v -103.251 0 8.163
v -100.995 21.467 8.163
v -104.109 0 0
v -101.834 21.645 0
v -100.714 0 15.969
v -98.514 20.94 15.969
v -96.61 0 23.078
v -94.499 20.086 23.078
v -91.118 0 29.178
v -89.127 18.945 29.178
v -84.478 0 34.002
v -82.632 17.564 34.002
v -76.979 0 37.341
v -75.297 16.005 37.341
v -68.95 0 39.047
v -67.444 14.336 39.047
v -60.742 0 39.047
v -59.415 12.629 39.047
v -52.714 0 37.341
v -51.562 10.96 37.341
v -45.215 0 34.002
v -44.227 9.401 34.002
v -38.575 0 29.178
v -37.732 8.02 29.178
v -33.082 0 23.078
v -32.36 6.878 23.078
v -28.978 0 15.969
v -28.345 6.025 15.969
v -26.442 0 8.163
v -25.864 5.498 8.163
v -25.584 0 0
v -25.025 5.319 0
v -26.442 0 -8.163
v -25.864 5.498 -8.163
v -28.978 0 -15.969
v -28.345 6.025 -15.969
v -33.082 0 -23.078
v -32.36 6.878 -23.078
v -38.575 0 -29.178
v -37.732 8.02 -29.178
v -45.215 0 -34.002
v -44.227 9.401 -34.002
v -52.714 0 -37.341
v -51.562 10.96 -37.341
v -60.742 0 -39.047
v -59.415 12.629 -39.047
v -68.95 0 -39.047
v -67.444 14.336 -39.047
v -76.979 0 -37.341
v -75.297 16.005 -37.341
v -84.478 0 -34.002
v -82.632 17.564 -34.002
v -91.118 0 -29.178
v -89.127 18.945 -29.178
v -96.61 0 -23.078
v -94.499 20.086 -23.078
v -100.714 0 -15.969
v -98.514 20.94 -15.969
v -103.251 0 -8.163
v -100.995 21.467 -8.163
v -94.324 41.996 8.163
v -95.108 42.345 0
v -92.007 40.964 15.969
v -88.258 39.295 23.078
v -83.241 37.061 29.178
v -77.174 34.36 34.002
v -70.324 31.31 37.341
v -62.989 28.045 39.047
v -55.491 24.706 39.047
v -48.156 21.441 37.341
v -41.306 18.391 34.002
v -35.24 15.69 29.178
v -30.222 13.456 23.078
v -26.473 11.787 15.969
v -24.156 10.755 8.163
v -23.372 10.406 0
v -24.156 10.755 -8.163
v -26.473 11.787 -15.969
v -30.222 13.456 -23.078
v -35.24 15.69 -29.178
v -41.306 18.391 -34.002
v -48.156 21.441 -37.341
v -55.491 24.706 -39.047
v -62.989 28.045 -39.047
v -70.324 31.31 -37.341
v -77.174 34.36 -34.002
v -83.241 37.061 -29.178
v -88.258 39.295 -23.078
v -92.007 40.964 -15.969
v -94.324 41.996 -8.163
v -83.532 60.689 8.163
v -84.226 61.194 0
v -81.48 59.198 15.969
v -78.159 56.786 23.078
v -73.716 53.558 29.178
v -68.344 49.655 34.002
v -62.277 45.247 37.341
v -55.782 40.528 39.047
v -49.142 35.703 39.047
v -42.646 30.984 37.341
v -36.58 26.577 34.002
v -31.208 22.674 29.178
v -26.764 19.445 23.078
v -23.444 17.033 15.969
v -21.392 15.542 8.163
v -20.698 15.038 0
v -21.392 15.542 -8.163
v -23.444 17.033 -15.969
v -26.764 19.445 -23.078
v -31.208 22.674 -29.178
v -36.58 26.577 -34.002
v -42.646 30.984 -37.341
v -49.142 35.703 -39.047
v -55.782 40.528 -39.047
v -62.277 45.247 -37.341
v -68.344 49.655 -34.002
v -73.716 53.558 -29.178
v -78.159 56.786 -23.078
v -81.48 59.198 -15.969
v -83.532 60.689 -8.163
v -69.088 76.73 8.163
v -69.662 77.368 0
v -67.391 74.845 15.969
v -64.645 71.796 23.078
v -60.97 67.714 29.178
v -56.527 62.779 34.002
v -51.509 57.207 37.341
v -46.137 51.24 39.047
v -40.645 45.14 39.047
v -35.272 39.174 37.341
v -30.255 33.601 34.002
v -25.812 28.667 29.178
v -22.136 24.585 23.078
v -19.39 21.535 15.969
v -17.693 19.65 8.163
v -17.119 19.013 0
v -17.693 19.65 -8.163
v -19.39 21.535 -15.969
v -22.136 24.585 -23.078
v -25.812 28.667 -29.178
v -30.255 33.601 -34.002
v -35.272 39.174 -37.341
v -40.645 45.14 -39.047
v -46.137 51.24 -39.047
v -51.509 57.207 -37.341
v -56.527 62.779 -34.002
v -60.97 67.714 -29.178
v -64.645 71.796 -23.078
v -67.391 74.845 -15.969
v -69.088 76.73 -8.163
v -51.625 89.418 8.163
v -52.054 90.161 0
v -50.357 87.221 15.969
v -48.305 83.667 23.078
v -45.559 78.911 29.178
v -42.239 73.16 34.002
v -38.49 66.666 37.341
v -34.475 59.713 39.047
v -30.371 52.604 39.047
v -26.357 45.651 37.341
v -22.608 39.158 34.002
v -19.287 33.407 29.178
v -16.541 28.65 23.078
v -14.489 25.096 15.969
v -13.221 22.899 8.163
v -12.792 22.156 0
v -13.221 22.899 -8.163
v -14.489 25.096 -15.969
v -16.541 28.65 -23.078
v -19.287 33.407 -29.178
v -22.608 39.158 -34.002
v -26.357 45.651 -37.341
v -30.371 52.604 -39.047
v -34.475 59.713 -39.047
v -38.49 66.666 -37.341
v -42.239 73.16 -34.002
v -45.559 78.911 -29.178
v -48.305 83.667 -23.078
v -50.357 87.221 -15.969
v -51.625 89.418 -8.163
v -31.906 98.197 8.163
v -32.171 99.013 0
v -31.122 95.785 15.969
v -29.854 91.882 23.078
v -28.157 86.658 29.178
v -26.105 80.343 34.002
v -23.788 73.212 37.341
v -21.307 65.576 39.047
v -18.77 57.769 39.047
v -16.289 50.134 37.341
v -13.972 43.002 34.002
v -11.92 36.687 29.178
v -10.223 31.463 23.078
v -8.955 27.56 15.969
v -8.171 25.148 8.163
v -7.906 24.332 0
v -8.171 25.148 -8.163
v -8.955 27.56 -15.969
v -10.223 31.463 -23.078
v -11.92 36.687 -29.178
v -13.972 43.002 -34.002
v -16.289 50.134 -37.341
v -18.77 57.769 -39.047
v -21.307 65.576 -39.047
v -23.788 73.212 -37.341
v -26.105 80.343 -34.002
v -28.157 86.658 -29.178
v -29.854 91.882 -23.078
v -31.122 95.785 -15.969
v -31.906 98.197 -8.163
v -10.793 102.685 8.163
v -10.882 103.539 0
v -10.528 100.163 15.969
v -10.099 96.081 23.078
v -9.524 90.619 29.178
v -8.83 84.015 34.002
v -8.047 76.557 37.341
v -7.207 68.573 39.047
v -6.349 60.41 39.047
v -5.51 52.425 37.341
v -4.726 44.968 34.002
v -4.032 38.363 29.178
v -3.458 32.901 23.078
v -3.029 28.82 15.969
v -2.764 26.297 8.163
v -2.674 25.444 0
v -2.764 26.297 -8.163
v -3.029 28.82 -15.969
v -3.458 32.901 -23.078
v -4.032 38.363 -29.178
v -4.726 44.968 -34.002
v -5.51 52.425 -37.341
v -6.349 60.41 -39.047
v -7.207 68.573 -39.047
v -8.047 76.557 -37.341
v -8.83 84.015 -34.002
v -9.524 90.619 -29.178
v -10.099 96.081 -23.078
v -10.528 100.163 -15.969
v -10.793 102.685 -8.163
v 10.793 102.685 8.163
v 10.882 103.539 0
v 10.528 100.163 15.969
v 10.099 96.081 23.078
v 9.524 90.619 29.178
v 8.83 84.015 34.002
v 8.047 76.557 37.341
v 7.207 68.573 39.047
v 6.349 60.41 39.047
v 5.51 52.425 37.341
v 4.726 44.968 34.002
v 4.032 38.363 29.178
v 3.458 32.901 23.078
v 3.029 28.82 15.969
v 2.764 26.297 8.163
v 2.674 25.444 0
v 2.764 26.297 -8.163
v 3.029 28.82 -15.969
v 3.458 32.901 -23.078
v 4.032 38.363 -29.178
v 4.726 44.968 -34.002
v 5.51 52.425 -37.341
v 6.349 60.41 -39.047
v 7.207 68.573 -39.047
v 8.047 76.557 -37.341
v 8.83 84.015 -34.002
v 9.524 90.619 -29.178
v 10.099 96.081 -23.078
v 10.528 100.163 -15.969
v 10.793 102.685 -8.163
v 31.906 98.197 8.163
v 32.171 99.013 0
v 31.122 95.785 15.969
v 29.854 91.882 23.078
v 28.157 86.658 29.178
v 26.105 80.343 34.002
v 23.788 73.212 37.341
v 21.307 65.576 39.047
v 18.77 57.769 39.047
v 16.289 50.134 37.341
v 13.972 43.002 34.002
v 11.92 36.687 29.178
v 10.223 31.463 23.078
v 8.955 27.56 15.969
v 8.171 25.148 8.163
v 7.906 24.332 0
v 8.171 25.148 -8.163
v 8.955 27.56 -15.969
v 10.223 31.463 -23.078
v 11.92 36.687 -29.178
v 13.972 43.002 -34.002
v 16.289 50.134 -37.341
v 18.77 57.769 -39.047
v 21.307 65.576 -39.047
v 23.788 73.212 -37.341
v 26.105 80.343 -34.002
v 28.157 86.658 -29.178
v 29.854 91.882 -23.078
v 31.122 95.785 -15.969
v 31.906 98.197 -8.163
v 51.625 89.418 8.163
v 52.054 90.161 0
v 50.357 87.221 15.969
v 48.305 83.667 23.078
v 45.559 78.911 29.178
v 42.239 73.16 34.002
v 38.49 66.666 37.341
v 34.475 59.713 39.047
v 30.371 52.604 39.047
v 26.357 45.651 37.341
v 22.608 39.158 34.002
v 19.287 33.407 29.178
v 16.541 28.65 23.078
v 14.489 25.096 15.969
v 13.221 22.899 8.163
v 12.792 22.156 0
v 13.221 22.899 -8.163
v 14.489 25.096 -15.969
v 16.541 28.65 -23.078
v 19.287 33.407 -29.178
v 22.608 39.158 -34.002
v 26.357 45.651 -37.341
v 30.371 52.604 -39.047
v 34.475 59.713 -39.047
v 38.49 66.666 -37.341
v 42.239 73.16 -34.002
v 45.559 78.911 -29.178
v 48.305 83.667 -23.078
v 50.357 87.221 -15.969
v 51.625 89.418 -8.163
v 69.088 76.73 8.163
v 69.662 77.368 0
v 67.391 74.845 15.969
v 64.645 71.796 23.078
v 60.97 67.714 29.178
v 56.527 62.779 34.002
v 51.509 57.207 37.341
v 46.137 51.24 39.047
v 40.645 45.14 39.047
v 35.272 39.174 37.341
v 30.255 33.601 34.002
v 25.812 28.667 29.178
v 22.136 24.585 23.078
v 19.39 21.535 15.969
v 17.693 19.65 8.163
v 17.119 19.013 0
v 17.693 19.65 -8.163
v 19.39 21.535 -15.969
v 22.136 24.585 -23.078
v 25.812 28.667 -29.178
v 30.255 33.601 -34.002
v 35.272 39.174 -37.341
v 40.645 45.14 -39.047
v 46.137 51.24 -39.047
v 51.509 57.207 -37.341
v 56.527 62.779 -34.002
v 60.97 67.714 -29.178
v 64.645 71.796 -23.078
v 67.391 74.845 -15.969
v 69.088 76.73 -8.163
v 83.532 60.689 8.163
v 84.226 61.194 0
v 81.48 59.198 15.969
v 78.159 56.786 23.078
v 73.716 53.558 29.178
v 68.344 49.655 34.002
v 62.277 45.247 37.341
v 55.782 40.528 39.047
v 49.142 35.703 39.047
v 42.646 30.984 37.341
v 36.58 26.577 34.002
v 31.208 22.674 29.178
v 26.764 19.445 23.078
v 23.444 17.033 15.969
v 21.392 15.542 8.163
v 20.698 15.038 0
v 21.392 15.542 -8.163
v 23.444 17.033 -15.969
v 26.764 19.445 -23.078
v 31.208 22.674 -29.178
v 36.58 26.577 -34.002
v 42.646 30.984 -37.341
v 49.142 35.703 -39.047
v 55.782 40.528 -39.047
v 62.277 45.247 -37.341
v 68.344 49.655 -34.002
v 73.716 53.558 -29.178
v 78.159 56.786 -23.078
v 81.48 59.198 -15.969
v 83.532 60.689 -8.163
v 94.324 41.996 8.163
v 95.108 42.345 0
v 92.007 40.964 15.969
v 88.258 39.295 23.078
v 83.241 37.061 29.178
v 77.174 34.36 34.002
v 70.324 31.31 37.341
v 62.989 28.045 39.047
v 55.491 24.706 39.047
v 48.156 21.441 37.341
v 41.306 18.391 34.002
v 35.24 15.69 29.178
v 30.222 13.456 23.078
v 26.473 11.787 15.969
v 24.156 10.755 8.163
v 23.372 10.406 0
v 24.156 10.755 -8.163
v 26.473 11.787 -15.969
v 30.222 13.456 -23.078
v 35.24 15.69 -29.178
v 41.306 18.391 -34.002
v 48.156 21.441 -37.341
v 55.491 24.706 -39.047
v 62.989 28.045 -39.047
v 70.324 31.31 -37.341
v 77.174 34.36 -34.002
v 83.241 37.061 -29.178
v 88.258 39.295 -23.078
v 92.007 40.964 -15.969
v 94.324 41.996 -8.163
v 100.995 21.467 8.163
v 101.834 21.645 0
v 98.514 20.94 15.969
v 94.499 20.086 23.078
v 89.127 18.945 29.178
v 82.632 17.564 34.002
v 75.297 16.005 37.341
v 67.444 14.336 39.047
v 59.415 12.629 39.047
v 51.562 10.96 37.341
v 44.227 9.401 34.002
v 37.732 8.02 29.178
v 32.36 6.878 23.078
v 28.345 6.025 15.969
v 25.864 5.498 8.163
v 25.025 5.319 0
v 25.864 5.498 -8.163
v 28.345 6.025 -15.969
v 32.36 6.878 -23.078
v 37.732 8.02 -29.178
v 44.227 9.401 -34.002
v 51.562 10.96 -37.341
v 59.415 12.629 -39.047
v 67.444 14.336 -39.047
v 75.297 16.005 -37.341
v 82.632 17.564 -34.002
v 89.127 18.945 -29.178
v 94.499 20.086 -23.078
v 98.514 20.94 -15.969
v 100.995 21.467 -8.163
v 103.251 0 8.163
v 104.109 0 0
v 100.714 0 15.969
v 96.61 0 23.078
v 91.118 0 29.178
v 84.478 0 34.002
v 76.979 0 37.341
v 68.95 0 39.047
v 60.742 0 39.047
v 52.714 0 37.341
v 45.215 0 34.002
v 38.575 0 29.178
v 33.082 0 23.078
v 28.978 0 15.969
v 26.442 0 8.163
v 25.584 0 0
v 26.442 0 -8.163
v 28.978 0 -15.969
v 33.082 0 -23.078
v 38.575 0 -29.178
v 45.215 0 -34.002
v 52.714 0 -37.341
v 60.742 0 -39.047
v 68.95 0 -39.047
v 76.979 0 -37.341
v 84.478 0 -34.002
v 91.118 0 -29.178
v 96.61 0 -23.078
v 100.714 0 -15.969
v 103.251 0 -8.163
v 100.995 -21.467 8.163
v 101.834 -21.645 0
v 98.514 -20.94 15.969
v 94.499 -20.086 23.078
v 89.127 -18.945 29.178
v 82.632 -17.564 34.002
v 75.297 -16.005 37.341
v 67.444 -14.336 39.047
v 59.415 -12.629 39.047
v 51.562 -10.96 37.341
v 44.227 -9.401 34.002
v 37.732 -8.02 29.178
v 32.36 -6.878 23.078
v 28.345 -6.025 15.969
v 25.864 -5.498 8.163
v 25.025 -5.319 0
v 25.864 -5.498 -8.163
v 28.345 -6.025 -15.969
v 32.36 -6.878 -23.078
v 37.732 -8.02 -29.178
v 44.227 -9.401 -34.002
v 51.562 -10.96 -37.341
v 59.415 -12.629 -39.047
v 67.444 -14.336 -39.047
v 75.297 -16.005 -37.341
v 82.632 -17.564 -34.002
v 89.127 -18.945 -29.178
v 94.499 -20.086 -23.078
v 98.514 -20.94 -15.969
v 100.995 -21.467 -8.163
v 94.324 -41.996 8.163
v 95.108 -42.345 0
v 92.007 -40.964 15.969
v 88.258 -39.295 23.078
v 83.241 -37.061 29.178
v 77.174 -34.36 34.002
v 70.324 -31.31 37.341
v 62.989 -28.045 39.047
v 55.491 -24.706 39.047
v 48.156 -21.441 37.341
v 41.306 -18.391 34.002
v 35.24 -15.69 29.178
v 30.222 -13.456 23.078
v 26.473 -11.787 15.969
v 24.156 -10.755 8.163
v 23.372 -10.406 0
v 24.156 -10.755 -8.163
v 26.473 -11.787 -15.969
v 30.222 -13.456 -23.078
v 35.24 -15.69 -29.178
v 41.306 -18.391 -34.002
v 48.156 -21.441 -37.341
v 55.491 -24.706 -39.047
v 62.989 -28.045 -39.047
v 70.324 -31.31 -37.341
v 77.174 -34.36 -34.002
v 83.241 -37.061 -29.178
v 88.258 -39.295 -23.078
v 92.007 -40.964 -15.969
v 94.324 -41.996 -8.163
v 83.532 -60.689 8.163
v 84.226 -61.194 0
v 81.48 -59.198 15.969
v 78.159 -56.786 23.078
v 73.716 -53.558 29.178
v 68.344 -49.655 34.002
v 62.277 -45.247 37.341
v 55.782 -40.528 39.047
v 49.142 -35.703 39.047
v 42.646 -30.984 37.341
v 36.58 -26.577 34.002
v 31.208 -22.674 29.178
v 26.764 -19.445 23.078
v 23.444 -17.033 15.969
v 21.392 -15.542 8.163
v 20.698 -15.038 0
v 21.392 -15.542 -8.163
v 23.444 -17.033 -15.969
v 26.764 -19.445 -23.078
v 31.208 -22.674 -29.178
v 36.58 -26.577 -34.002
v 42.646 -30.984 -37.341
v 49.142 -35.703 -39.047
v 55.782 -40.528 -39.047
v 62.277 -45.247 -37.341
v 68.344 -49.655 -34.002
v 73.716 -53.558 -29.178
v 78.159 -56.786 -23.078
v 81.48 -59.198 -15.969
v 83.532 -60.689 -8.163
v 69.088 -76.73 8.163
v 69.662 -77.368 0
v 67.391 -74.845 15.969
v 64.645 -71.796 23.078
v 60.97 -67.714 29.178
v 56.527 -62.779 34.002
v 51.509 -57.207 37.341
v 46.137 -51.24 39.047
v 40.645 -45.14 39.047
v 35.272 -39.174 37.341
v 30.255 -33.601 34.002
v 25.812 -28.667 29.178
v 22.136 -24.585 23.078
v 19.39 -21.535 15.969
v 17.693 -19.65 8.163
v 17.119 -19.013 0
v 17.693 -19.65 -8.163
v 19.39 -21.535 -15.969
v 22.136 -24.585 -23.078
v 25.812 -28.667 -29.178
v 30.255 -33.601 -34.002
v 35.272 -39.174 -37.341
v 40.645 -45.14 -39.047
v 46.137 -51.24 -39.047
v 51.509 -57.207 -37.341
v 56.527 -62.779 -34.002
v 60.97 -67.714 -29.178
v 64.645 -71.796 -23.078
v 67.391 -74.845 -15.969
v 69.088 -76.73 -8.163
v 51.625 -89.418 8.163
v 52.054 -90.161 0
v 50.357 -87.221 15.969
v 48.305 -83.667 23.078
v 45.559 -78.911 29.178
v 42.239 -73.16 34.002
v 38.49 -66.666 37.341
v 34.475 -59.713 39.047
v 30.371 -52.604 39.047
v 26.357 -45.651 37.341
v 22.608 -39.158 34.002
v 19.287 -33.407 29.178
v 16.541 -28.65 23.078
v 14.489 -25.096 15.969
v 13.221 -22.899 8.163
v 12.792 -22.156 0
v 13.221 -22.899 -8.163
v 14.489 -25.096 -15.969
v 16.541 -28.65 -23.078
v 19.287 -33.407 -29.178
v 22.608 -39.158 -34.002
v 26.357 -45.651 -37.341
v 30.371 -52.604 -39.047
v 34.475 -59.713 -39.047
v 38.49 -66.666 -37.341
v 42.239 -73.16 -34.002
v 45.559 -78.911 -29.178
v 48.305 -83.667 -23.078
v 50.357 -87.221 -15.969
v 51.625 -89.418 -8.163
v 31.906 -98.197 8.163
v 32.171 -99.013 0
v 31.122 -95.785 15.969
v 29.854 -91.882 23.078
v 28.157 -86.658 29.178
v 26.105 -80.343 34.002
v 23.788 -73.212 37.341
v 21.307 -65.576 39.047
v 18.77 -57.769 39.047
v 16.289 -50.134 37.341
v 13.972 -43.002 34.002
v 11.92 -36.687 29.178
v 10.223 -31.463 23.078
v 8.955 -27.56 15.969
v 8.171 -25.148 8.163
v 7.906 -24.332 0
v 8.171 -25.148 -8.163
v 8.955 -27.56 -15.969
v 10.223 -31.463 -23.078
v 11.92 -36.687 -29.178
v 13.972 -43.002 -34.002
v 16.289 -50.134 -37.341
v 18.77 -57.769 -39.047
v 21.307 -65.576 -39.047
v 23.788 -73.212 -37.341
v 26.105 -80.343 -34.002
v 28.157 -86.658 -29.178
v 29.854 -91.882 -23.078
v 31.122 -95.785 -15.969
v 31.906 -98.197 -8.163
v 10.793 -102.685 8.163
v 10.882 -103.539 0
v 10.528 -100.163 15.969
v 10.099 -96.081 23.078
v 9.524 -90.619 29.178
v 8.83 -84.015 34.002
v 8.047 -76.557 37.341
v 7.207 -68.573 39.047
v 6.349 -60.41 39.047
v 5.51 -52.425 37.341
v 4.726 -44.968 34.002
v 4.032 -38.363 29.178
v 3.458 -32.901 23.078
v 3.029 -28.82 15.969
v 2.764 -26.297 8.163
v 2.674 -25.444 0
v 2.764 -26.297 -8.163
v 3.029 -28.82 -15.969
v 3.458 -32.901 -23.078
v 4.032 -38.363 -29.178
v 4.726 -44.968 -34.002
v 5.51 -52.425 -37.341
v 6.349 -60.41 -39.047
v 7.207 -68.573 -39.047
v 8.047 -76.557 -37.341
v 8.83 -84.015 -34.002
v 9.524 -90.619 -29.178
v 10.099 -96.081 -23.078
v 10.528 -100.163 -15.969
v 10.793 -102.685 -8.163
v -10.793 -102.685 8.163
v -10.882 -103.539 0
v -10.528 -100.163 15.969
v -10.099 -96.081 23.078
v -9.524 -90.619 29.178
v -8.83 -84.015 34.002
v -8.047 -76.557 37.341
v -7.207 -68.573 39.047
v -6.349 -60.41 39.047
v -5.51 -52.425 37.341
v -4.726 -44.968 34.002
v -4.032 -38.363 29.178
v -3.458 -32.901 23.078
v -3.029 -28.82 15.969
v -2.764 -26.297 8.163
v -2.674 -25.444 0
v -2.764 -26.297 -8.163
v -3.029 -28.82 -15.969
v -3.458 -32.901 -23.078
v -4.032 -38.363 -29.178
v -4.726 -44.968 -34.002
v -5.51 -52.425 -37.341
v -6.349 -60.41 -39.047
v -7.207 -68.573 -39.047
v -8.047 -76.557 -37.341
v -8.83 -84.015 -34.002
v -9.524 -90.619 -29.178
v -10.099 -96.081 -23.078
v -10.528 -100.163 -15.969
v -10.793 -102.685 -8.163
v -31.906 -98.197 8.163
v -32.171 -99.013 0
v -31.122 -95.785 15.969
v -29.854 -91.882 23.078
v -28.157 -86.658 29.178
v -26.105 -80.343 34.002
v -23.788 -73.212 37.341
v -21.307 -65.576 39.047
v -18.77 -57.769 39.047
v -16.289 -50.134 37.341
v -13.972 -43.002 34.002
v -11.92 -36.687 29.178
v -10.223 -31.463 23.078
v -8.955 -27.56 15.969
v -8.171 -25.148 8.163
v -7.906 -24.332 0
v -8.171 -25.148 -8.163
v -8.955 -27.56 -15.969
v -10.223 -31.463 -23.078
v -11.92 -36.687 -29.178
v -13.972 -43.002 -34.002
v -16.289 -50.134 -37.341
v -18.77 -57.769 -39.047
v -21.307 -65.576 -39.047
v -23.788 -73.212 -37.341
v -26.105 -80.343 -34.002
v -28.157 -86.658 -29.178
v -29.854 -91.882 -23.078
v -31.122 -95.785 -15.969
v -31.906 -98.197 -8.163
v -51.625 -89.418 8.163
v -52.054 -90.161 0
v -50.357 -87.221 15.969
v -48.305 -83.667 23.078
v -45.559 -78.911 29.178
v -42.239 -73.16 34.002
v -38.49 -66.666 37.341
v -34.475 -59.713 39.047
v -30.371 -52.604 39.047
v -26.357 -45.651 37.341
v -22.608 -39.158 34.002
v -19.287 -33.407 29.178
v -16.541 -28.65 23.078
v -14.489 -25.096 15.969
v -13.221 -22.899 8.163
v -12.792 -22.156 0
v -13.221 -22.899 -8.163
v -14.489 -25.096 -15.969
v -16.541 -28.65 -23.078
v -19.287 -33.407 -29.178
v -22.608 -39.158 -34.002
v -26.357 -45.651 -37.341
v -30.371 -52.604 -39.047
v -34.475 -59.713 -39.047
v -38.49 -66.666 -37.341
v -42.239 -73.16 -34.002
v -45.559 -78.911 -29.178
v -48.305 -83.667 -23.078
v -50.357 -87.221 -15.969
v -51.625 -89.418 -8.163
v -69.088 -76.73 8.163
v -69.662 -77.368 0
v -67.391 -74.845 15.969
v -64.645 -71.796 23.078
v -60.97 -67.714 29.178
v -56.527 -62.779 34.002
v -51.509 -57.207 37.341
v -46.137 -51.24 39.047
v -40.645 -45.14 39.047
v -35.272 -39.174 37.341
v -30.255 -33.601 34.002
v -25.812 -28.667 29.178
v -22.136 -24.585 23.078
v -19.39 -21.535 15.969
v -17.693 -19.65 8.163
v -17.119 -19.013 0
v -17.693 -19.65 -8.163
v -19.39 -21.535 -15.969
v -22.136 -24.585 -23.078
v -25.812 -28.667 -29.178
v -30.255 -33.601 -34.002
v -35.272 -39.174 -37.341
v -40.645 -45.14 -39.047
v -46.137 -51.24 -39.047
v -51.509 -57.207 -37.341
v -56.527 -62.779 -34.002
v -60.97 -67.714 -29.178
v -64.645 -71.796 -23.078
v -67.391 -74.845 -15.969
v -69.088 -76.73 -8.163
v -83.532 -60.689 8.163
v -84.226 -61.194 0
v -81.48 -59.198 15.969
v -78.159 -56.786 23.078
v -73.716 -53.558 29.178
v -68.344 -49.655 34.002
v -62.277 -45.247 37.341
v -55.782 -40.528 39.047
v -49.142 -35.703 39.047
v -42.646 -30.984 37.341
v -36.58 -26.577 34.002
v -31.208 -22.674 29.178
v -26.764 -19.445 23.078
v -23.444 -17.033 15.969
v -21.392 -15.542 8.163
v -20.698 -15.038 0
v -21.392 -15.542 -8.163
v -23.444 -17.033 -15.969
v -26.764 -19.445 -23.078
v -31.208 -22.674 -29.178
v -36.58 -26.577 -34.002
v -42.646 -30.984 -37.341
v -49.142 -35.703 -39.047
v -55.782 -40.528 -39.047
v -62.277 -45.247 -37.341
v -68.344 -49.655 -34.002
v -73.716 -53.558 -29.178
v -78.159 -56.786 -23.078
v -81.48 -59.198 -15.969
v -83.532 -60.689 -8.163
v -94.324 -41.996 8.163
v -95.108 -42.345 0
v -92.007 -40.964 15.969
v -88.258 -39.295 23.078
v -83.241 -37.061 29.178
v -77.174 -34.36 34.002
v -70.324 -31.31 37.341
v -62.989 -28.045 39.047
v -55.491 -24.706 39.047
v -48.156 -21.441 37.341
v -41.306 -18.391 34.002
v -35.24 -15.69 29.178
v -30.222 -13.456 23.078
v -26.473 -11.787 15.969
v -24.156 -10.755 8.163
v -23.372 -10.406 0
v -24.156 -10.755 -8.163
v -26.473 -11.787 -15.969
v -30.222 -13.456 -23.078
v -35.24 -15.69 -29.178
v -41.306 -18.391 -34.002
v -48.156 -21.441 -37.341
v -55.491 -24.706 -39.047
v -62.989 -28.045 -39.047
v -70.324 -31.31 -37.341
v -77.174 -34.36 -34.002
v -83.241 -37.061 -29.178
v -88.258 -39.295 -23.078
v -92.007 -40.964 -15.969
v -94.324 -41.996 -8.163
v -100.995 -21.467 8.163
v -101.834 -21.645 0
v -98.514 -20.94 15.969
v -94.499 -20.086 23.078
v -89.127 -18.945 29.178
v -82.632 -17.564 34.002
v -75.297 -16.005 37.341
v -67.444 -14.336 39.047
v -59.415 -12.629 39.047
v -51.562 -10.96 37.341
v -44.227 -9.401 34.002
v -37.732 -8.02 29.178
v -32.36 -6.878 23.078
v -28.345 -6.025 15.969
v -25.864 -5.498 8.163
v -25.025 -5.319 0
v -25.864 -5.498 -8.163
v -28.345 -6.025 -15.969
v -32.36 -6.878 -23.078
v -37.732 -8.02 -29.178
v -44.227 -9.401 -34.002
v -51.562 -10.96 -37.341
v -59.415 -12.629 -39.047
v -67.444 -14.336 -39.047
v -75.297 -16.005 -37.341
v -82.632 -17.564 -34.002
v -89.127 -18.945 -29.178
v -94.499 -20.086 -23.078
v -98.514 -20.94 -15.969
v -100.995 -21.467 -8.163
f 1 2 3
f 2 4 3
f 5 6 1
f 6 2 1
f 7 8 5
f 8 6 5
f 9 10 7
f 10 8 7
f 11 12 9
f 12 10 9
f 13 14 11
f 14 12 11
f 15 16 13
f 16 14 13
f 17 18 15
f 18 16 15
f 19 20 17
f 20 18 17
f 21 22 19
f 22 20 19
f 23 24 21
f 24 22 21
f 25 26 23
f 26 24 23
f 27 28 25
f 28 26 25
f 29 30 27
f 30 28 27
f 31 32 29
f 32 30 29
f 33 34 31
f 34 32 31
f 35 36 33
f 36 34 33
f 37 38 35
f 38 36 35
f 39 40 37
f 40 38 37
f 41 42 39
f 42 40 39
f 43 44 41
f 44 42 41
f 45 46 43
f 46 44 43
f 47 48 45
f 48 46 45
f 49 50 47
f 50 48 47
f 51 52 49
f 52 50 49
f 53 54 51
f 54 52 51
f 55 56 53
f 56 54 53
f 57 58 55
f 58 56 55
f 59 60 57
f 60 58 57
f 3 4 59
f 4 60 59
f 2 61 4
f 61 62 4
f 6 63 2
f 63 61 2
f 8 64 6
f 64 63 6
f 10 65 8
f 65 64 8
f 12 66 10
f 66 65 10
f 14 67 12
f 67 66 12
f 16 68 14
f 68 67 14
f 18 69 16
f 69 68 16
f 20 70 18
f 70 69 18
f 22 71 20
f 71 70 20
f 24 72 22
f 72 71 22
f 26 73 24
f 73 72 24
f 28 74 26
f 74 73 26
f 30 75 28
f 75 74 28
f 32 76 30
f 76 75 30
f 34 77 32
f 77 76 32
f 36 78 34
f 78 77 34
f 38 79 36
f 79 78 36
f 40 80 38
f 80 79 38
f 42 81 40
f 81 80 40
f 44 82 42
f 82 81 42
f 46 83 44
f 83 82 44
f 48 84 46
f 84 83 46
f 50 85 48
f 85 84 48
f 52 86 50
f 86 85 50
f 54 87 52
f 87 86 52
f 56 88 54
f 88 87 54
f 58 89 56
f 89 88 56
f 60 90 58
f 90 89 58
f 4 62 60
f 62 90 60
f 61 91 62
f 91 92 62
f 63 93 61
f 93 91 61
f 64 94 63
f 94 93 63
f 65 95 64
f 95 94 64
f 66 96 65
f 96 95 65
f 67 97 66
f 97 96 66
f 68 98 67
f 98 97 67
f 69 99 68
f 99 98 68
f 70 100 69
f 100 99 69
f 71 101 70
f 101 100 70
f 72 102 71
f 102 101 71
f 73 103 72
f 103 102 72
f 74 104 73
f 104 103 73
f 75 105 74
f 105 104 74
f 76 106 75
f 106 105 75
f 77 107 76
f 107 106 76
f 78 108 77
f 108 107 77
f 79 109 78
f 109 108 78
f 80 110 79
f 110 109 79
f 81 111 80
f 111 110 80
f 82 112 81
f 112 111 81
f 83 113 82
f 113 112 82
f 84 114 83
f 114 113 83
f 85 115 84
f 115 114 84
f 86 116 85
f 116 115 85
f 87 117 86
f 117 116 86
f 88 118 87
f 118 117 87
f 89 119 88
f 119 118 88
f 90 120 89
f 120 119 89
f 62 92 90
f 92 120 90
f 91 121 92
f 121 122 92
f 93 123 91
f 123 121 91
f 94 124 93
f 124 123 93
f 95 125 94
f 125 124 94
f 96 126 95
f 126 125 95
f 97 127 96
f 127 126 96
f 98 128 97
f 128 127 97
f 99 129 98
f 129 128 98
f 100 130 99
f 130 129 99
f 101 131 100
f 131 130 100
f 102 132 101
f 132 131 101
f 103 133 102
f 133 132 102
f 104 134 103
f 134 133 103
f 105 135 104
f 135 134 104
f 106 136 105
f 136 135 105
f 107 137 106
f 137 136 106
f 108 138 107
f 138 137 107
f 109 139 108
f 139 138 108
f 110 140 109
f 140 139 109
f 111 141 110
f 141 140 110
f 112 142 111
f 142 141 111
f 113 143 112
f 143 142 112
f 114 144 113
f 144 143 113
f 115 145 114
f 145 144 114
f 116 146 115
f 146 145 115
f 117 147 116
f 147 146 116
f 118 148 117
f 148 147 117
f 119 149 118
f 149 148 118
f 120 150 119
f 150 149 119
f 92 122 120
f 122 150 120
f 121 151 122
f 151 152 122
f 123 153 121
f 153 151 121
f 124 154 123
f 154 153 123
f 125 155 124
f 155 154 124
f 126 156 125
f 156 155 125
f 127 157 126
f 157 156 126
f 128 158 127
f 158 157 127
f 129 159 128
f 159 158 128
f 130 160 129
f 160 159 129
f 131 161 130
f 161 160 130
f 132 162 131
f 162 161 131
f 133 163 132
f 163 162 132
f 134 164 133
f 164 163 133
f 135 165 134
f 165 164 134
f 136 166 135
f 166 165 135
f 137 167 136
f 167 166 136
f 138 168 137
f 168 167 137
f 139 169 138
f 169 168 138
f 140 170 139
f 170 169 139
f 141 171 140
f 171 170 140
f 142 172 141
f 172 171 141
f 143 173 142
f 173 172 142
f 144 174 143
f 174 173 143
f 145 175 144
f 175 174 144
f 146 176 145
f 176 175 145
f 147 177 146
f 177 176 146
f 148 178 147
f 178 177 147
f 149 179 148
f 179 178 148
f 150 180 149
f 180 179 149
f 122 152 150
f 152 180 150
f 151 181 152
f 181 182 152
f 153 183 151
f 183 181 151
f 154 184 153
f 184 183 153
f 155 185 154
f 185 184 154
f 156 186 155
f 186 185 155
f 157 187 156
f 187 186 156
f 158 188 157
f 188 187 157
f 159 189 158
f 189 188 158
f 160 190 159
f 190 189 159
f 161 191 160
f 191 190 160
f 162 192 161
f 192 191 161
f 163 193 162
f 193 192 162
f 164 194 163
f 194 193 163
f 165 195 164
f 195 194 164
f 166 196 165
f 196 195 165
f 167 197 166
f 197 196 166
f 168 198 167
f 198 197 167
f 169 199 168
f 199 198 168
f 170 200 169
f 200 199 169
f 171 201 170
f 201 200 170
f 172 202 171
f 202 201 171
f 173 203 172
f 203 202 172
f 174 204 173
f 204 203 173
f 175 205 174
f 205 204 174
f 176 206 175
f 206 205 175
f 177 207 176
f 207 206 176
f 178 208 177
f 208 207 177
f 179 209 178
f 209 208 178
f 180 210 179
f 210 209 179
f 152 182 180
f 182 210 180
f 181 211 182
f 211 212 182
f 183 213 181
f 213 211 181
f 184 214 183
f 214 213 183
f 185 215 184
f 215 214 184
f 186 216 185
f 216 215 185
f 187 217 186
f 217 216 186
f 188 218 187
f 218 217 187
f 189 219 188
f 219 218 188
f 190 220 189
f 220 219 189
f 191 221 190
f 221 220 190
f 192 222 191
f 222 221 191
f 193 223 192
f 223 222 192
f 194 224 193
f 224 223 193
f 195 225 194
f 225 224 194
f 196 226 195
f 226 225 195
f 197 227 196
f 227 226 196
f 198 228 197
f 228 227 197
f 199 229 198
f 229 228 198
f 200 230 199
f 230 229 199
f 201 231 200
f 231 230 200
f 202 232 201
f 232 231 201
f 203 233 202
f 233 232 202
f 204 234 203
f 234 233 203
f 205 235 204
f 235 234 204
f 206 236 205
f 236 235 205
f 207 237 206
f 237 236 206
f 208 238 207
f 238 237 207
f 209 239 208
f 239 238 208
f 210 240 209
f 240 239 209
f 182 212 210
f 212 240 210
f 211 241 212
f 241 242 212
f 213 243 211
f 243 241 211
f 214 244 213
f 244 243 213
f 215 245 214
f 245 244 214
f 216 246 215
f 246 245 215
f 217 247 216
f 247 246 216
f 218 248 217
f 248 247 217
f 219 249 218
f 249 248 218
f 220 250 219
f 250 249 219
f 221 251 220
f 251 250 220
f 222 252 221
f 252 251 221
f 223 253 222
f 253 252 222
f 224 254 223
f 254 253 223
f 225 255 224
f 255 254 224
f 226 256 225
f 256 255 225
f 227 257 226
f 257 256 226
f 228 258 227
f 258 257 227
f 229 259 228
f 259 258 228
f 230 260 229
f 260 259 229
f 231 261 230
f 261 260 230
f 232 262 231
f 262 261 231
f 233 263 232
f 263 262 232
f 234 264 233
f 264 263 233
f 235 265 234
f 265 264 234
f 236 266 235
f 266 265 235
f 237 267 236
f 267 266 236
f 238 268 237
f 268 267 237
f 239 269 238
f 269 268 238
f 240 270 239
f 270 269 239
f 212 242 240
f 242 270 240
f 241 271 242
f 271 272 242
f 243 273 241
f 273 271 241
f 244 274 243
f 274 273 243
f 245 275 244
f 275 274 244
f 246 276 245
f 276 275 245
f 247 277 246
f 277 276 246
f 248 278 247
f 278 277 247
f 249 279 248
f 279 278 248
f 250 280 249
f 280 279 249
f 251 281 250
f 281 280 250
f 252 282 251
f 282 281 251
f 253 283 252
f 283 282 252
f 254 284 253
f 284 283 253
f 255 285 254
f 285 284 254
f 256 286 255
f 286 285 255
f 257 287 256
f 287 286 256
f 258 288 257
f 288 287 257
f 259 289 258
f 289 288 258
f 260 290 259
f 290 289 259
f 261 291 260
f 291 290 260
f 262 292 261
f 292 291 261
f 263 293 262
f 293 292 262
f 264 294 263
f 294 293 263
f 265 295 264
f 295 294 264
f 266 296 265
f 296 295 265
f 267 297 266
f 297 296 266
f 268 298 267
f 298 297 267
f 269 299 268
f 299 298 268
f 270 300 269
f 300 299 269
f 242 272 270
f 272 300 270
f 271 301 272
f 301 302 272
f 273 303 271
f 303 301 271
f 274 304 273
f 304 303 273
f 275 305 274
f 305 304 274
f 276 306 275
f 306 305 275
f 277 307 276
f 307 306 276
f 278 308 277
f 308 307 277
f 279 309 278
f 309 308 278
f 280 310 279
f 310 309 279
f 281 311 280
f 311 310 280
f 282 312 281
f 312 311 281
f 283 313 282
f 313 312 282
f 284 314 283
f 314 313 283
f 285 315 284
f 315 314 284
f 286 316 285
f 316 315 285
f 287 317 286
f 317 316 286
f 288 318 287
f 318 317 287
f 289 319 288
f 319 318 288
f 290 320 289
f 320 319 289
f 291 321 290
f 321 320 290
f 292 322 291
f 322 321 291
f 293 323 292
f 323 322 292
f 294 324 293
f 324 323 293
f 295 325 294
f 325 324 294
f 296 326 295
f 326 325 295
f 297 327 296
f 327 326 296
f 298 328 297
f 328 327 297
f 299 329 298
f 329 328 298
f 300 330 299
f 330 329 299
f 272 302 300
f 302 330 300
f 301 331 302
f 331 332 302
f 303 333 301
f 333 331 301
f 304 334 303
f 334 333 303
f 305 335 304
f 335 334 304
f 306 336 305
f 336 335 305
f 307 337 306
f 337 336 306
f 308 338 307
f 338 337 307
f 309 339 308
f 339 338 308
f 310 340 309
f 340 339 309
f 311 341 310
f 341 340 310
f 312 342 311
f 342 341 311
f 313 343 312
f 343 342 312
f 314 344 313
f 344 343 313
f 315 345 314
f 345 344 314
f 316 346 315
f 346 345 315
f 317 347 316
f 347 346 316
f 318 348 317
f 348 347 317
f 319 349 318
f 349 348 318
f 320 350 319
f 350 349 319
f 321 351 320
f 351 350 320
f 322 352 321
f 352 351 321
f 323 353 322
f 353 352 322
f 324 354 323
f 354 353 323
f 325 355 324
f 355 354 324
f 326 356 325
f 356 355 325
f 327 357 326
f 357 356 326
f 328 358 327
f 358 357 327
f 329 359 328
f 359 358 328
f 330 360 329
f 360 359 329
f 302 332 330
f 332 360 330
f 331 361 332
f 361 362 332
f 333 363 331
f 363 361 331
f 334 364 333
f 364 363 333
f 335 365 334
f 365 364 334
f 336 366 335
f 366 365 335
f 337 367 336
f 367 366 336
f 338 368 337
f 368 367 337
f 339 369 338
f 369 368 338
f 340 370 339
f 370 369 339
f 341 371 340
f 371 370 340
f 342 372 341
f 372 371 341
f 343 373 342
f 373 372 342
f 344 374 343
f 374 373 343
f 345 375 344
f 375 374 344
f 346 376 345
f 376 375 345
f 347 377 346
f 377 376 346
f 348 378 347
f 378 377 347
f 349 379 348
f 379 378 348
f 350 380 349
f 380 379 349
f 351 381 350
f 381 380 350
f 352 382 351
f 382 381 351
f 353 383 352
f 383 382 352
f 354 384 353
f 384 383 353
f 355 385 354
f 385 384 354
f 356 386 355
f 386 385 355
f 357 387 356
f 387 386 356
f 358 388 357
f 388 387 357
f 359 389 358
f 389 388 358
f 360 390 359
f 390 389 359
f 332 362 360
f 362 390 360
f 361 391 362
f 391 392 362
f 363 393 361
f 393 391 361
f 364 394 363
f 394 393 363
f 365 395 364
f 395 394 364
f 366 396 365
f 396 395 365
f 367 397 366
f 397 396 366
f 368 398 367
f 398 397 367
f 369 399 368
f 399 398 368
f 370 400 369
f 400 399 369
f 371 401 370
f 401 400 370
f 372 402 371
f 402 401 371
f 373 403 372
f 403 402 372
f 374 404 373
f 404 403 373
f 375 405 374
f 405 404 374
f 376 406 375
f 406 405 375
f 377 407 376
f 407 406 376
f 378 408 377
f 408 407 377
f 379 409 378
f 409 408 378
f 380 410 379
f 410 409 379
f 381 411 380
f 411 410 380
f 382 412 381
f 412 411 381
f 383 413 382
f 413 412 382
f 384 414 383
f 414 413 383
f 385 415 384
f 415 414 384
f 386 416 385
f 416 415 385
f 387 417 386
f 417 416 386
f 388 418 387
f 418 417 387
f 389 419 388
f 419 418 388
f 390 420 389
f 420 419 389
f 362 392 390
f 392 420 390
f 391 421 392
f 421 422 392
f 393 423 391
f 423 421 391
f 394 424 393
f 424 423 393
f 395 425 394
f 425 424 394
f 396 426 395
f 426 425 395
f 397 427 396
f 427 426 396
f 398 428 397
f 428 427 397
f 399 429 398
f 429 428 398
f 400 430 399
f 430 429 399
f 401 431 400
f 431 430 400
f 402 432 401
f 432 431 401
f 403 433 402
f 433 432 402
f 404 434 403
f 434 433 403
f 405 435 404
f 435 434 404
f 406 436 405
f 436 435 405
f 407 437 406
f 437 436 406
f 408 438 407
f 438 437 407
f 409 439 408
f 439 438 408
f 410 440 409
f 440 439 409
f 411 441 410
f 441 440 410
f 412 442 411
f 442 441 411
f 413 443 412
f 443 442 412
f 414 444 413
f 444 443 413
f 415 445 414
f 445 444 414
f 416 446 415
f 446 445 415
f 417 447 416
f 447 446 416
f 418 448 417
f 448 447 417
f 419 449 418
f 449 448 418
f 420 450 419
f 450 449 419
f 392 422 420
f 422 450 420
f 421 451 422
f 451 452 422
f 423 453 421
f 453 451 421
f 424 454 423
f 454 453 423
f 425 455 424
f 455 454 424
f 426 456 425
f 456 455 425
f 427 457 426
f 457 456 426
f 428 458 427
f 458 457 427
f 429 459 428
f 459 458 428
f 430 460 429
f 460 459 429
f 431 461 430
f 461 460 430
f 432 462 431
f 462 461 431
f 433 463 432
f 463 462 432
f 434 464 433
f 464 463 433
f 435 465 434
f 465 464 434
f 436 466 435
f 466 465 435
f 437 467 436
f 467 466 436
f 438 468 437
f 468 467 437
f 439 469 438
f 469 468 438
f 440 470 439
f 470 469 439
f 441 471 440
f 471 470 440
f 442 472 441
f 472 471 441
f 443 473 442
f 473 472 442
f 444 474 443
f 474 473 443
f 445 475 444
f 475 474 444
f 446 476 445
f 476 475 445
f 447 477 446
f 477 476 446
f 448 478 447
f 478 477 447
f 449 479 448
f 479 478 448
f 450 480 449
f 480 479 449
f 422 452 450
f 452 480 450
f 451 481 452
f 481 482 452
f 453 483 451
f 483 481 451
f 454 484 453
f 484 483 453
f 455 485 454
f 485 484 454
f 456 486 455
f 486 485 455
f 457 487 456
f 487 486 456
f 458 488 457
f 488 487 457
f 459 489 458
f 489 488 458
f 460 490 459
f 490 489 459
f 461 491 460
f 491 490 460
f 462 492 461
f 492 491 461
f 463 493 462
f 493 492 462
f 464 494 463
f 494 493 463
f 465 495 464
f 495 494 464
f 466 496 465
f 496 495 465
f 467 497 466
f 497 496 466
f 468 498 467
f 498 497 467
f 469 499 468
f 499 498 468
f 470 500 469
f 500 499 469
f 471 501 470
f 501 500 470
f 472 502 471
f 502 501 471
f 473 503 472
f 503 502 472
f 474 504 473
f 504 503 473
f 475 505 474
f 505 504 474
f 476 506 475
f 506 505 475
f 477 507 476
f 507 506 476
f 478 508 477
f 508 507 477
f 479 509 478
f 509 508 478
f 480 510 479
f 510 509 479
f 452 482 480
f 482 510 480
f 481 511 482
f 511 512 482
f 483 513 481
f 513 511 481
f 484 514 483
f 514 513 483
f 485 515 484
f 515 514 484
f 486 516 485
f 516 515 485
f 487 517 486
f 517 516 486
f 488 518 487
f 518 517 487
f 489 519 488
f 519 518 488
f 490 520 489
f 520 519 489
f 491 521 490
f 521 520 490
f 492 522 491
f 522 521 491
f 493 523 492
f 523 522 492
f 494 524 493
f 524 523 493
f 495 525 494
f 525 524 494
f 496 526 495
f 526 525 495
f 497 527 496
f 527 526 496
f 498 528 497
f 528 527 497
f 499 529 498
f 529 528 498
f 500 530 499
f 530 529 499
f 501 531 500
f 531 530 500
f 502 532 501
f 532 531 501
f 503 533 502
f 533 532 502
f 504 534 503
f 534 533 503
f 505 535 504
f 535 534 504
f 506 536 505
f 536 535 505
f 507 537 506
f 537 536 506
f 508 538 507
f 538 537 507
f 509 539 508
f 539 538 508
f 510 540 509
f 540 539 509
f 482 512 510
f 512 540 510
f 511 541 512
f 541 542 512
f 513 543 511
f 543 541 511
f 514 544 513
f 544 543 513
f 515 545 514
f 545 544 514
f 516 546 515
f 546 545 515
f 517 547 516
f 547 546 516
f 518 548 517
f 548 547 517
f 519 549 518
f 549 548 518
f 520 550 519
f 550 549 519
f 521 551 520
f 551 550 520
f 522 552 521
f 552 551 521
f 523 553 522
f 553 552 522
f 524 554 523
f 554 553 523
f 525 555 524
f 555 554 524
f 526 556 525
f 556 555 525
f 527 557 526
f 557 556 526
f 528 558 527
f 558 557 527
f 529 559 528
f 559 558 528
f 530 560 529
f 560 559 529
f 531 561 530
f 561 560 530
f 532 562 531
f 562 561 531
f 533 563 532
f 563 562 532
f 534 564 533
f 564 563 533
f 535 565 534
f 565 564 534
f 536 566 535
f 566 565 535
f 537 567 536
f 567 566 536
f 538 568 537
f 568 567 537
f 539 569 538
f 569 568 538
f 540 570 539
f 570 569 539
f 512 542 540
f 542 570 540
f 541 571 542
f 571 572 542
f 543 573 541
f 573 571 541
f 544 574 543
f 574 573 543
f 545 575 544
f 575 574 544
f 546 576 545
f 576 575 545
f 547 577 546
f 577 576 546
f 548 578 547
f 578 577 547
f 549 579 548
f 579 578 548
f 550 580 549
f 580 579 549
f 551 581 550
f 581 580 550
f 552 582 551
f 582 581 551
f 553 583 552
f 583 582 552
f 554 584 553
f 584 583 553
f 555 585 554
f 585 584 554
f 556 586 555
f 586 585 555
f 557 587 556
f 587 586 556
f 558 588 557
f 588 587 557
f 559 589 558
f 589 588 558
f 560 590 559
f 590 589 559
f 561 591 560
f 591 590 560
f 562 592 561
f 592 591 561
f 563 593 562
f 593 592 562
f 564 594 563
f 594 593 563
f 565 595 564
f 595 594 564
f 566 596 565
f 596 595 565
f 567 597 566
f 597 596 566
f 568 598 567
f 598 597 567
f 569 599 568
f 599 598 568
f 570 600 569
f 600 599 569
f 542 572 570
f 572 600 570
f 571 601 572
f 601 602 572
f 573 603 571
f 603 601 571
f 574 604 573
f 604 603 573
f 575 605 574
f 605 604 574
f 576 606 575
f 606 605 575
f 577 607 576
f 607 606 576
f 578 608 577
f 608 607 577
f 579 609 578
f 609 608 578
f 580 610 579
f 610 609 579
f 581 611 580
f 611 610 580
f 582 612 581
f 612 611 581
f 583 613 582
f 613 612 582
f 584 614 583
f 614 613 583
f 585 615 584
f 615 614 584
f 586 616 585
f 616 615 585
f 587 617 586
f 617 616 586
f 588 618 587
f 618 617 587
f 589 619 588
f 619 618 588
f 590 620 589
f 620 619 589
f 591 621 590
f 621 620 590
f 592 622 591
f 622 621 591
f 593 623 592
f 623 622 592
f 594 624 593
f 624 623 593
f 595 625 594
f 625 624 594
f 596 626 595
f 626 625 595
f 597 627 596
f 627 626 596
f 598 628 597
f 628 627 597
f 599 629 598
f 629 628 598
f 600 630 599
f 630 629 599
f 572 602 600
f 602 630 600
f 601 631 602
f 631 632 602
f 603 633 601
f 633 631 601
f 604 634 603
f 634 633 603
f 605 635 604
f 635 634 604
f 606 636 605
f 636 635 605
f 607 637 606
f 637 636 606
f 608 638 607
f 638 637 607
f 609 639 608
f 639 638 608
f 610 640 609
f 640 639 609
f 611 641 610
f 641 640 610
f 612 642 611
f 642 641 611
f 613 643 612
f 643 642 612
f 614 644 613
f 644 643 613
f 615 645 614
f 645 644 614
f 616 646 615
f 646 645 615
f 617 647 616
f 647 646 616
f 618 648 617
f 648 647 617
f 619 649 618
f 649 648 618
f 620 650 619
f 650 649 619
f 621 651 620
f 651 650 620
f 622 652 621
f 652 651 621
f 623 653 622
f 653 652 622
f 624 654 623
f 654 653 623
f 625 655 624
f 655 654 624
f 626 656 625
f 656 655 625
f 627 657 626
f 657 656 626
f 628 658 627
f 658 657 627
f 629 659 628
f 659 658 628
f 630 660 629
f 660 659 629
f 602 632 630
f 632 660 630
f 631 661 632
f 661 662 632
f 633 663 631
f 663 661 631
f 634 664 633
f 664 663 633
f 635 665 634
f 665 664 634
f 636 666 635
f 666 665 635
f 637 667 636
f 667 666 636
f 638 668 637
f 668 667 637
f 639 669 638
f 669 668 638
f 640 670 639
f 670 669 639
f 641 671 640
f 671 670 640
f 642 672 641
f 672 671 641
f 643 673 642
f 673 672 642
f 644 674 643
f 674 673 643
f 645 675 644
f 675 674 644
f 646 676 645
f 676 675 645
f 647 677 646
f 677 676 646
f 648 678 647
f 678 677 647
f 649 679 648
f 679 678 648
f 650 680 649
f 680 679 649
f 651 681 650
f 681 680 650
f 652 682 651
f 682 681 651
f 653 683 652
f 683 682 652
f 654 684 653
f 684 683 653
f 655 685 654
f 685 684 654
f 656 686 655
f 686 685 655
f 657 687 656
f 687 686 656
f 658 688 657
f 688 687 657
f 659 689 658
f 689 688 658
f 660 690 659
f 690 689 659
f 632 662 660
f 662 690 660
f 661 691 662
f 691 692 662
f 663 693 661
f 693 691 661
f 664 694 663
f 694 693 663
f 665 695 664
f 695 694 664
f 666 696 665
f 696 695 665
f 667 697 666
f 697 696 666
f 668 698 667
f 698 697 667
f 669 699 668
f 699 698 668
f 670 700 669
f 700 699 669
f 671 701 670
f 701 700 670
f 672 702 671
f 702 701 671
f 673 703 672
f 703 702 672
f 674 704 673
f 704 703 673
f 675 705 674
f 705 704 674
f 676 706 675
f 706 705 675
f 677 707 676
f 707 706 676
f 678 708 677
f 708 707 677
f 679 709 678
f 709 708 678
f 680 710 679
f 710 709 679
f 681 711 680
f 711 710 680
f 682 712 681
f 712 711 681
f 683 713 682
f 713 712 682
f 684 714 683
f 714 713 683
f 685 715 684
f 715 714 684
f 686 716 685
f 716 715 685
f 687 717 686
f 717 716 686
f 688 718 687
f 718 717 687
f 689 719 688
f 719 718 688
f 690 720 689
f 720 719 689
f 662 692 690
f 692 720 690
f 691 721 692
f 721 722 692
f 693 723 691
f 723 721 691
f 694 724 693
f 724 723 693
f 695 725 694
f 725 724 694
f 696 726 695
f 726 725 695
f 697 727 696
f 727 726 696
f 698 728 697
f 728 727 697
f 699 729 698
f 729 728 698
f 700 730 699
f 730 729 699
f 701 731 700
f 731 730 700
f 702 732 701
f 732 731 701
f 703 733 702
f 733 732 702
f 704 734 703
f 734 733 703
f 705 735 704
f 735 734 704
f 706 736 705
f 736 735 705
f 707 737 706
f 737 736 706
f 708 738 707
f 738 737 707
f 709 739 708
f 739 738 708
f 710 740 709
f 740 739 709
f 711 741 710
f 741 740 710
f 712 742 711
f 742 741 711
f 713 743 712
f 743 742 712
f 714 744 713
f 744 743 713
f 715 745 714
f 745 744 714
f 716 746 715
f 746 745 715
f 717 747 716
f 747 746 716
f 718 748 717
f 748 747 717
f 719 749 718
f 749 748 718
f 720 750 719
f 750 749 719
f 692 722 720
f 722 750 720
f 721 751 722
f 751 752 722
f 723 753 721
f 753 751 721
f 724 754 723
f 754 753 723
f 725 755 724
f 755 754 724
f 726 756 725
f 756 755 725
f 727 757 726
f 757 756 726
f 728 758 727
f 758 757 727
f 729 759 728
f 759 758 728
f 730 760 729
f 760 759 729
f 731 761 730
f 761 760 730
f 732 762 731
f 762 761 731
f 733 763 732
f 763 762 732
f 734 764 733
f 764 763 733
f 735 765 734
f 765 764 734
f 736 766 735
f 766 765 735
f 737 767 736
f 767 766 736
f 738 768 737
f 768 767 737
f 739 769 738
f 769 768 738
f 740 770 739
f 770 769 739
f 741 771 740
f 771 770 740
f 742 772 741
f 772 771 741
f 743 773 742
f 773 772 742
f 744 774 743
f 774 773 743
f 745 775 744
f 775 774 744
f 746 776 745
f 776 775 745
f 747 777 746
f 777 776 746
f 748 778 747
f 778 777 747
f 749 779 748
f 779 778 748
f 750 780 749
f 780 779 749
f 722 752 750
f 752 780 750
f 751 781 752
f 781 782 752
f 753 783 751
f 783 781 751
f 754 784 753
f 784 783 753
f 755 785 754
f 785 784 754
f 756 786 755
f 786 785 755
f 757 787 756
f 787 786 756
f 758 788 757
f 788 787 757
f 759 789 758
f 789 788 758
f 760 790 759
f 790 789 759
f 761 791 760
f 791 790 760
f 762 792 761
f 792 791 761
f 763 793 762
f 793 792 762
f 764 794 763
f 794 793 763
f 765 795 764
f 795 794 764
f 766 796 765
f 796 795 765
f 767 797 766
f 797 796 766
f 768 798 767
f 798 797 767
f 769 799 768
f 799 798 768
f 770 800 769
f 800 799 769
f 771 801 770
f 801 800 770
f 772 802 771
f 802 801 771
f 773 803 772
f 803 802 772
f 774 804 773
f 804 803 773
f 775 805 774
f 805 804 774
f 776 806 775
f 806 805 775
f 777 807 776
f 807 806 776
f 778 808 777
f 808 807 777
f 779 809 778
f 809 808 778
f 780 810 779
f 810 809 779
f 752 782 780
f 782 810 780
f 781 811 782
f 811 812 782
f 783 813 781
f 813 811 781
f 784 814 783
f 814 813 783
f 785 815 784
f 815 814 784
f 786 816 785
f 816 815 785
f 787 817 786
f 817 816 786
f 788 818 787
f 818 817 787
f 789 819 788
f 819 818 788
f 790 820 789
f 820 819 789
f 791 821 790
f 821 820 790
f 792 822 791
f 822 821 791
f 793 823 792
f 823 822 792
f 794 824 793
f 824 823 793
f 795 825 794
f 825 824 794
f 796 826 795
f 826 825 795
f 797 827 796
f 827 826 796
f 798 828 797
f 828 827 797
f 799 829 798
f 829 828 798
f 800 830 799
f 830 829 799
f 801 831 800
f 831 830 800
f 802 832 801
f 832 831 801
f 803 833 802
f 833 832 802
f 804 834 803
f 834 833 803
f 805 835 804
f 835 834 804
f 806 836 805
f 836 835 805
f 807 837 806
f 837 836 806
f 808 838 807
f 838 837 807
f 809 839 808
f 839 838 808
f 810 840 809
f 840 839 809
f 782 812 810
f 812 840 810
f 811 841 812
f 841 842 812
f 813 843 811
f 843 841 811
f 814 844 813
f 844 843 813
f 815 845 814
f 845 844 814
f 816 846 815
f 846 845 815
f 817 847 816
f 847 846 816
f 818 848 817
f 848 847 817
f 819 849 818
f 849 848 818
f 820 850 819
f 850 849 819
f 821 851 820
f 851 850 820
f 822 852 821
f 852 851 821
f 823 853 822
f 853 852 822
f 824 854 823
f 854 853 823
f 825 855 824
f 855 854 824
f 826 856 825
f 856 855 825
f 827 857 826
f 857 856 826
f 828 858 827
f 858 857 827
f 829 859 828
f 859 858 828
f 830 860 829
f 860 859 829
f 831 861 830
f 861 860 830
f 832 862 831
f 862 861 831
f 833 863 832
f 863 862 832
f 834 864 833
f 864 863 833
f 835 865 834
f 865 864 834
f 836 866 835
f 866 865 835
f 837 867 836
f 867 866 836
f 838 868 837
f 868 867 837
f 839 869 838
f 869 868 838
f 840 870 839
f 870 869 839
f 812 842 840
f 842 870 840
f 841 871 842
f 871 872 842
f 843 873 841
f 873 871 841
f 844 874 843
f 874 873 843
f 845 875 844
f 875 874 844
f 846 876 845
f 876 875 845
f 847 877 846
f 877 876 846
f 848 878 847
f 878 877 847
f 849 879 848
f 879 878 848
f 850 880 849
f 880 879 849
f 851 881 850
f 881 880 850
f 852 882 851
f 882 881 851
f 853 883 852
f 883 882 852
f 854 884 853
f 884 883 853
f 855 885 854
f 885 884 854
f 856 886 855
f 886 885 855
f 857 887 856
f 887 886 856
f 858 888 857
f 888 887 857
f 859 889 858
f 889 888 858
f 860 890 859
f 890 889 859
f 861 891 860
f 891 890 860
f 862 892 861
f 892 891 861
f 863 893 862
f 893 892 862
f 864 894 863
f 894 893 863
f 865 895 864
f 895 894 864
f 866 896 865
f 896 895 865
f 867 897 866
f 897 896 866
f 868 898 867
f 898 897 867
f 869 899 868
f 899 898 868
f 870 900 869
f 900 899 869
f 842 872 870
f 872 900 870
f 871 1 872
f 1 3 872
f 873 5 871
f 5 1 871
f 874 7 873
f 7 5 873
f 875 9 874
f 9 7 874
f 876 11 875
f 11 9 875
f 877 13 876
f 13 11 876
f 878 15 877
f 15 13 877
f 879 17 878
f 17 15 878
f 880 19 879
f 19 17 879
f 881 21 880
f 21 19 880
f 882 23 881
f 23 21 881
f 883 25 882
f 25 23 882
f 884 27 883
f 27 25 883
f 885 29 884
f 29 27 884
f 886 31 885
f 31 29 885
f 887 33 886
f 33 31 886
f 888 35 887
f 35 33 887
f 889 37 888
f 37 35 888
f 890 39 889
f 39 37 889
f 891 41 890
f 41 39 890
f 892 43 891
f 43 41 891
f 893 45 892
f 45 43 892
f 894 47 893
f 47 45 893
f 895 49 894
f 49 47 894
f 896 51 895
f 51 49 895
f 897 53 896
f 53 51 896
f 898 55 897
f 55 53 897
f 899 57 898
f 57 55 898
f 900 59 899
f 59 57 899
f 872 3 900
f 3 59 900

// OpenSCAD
torus(rnd(00,200),rnd(100,300));
module torus (ri,ro)
{
r=(max(ro,ri)-min(ro,ri))/2;
rotate_extrude(angle = 360, convexity = 2) translate([ri+r,0,0])circle(r);
}
function rnd(a=1,b=0)=rands(min(a,b),max(a,b),1)[0];
